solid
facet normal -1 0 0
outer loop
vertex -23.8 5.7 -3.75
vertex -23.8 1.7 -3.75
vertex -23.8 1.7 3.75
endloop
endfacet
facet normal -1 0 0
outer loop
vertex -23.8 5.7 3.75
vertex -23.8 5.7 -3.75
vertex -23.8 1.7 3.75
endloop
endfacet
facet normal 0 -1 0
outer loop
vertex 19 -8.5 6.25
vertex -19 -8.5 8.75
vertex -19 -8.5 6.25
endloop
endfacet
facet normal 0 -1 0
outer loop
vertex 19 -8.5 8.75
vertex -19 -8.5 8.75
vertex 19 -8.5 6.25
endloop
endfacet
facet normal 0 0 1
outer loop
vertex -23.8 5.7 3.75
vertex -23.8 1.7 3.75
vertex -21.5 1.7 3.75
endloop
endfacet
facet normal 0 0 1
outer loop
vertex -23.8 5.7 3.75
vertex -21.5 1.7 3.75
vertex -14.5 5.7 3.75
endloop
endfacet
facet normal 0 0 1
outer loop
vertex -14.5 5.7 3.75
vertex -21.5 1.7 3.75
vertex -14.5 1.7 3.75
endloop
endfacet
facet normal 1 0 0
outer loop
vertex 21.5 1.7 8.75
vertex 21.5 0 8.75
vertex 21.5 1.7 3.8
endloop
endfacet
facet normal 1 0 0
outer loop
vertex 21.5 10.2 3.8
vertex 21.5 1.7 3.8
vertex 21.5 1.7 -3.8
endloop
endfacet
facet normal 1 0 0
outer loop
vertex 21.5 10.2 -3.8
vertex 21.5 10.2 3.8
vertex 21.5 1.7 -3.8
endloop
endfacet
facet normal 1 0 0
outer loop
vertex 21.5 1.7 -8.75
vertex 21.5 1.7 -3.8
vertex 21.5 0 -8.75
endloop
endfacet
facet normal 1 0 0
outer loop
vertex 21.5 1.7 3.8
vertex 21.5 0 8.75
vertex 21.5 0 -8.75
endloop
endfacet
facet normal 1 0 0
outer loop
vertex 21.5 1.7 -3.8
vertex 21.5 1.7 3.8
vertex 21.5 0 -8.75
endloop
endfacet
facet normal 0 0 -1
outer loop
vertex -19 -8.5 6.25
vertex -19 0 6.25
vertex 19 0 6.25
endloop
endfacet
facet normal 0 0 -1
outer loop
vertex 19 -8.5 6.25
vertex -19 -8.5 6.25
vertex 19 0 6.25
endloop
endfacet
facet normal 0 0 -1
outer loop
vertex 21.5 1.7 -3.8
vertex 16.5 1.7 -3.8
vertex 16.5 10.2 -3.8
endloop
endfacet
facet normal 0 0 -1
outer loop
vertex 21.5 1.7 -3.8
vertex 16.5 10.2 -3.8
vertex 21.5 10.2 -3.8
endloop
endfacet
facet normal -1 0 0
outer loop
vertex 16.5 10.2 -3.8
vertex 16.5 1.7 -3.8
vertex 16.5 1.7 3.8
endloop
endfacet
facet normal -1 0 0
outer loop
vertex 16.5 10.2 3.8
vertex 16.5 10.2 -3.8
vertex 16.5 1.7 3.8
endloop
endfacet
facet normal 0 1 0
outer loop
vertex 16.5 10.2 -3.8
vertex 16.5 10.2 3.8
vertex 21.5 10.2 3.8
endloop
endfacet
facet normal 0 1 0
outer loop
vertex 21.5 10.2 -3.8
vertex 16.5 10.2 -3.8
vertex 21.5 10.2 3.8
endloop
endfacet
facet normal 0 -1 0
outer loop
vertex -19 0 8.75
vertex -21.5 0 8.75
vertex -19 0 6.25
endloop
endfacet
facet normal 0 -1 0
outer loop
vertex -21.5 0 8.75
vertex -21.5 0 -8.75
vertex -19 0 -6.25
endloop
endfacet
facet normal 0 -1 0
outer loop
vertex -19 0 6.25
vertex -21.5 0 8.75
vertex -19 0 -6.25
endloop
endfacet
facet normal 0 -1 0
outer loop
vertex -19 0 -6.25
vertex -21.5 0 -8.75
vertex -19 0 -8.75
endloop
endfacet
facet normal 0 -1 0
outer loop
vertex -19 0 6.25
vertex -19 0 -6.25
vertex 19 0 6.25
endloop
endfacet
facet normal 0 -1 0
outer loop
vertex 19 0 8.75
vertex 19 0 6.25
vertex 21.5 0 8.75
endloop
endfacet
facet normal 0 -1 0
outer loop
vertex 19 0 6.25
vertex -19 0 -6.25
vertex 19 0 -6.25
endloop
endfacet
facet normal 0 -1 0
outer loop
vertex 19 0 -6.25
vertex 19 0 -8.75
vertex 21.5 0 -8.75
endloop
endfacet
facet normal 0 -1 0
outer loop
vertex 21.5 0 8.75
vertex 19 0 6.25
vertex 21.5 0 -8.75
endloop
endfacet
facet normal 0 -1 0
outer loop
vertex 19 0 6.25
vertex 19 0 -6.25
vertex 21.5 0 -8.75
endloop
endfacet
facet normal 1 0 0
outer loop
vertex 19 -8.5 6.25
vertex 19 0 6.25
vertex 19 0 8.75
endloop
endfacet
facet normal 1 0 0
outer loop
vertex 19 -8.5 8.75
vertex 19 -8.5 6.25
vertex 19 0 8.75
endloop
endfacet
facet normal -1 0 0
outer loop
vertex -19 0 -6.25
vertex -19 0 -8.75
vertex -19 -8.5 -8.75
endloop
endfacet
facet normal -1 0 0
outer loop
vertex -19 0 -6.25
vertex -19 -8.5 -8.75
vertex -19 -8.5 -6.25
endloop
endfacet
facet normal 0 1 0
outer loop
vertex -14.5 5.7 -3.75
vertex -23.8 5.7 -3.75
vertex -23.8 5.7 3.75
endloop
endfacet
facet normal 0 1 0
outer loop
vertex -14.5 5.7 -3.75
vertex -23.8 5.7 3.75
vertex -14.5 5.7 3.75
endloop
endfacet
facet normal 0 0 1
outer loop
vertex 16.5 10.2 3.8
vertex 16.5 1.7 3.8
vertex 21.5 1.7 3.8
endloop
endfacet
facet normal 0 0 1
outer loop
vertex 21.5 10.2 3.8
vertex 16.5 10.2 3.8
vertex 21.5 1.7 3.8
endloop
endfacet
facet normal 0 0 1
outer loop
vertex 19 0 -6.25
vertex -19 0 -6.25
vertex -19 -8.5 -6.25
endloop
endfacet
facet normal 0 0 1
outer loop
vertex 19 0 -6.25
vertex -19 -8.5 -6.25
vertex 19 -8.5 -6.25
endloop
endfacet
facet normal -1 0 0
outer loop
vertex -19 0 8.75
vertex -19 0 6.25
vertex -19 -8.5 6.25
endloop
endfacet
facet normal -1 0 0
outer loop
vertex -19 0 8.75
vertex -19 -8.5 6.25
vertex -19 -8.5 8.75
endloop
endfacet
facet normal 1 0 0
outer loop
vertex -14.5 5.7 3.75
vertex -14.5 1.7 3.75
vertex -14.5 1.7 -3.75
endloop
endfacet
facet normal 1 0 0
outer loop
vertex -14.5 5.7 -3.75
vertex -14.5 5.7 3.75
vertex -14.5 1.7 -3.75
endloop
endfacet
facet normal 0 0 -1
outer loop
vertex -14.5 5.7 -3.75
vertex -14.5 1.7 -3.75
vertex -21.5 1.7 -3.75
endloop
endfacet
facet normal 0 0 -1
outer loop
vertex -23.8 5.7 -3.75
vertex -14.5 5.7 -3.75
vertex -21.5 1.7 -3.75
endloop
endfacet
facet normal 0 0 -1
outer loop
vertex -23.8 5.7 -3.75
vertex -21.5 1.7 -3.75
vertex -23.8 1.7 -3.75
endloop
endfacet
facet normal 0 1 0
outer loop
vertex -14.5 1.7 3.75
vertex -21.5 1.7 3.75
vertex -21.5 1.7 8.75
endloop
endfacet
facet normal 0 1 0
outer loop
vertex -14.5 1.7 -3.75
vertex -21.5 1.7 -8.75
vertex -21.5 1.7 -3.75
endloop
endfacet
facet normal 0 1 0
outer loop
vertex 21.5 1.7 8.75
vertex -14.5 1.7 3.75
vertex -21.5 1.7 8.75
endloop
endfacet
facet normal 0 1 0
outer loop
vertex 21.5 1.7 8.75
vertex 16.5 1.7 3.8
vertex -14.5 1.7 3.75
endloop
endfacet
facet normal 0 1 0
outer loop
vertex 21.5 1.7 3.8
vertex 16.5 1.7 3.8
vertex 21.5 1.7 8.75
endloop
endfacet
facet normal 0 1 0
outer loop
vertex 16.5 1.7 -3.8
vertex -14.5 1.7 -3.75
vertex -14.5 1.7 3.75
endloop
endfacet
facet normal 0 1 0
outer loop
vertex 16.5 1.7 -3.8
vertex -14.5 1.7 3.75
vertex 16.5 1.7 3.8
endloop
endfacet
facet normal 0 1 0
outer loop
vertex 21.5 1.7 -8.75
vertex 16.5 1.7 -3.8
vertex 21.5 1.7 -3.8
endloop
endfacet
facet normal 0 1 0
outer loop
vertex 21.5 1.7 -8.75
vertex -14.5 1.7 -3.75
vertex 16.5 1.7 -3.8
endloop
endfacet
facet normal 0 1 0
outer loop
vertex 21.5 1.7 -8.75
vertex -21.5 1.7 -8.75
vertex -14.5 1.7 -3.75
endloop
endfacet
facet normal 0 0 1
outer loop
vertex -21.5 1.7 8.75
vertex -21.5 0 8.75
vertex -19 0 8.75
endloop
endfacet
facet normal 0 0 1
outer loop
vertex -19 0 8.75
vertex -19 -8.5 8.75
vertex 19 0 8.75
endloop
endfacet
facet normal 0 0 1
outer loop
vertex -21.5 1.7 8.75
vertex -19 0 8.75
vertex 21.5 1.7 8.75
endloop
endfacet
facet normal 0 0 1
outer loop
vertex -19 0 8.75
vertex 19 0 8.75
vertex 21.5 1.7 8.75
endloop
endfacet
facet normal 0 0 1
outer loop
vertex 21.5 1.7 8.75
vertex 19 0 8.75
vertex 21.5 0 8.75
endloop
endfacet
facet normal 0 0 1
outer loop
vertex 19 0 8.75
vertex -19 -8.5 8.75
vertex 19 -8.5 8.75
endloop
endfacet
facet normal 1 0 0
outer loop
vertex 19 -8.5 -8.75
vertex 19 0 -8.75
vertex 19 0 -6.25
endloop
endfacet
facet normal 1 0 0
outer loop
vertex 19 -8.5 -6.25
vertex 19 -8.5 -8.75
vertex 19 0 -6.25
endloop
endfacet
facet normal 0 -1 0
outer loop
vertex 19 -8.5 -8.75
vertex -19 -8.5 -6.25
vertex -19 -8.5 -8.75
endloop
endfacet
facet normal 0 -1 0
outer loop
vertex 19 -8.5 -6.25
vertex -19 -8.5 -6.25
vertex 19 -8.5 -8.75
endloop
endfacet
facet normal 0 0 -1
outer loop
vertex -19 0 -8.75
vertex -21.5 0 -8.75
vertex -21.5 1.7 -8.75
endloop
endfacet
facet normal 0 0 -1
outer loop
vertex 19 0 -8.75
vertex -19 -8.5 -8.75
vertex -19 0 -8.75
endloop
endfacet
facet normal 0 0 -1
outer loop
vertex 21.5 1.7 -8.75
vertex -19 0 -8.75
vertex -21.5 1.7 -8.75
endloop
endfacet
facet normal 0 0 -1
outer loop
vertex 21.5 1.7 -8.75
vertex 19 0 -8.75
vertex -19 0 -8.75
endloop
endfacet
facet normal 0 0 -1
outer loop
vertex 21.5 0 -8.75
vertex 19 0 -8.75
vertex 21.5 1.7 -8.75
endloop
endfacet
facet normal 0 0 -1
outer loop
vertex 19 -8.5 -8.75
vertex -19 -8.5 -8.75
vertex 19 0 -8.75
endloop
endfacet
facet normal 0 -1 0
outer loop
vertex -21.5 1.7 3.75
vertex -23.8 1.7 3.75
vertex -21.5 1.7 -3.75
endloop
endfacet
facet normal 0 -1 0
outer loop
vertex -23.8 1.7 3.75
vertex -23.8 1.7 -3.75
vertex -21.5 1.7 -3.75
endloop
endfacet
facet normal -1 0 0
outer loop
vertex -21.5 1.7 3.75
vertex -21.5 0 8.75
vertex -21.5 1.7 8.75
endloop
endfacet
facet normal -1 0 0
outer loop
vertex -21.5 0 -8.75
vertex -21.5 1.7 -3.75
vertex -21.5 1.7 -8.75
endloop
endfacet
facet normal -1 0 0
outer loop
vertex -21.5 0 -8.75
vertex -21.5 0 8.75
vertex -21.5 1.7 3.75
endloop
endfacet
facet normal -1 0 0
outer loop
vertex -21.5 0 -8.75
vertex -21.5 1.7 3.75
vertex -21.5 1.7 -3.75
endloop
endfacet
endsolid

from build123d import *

# Parameters (mm, degrees)
SKETCH_1_W      = 43
SKETCH_1_H      = 17.5
EXTRUDE_1_DEPTH = 1.7
SKETCH_2_W      = 5
SKETCH_2_H      = 7.6
EXTRUDE_2_DEPTH = 8.5
SKETCH_2_3_W    = 9.3
SKETCH_2_3_H    = 7.5
EXTRUDE_3_DEPTH = 4
SKETCH_4_W      = 38
SKETCH_4_H      = 2.5
EXTRUDE_4_DEPTH = 8.5


with BuildPart() as part:
    # Эскиз1 → Бобышка-Вытянуть1 (new body)
    with BuildSketch(Plane(origin=(0, 0, 0), x_dir=(1, 0, 0), z_dir=(0, 1, 0))):
        Rectangle(SKETCH_1_W, SKETCH_1_H)
    extrude(amount=EXTRUDE_1_DEPTH)

    # Эскиз2 → Бобышка-Вытянуть2 (add)
    with BuildSketch(Plane(origin=(0, 1.7, 0), x_dir=(1, 0, 0), z_dir=(0, 1, 0))):
        with Locations((19, 0)):
            Rectangle(SKETCH_2_W, SKETCH_2_H)
    extrude(amount=EXTRUDE_2_DEPTH)

    # Эскиз2<3> → Бобышка-Вытянуть3 (add)
    with BuildSketch(Plane(origin=(0, 1.7, 0), x_dir=(1, 0, 0), z_dir=(0, 1, 0))):
        with Locations((-19.15, 0)):
            Rectangle(SKETCH_2_3_W, SKETCH_2_3_H)
    extrude(amount=EXTRUDE_3_DEPTH)

    # Эскиз4 → Бобышка-Вытянуть4 (add)
    with BuildSketch(Plane.XZ):
        with Locations((0, 7.5)):
            Rectangle(SKETCH_4_W, SKETCH_4_H)
        with Locations((0, -7.5)):
            Rectangle(SKETCH_4_W, SKETCH_4_H)
    extrude(amount=EXTRUDE_4_DEPTH)


solid = part.part
